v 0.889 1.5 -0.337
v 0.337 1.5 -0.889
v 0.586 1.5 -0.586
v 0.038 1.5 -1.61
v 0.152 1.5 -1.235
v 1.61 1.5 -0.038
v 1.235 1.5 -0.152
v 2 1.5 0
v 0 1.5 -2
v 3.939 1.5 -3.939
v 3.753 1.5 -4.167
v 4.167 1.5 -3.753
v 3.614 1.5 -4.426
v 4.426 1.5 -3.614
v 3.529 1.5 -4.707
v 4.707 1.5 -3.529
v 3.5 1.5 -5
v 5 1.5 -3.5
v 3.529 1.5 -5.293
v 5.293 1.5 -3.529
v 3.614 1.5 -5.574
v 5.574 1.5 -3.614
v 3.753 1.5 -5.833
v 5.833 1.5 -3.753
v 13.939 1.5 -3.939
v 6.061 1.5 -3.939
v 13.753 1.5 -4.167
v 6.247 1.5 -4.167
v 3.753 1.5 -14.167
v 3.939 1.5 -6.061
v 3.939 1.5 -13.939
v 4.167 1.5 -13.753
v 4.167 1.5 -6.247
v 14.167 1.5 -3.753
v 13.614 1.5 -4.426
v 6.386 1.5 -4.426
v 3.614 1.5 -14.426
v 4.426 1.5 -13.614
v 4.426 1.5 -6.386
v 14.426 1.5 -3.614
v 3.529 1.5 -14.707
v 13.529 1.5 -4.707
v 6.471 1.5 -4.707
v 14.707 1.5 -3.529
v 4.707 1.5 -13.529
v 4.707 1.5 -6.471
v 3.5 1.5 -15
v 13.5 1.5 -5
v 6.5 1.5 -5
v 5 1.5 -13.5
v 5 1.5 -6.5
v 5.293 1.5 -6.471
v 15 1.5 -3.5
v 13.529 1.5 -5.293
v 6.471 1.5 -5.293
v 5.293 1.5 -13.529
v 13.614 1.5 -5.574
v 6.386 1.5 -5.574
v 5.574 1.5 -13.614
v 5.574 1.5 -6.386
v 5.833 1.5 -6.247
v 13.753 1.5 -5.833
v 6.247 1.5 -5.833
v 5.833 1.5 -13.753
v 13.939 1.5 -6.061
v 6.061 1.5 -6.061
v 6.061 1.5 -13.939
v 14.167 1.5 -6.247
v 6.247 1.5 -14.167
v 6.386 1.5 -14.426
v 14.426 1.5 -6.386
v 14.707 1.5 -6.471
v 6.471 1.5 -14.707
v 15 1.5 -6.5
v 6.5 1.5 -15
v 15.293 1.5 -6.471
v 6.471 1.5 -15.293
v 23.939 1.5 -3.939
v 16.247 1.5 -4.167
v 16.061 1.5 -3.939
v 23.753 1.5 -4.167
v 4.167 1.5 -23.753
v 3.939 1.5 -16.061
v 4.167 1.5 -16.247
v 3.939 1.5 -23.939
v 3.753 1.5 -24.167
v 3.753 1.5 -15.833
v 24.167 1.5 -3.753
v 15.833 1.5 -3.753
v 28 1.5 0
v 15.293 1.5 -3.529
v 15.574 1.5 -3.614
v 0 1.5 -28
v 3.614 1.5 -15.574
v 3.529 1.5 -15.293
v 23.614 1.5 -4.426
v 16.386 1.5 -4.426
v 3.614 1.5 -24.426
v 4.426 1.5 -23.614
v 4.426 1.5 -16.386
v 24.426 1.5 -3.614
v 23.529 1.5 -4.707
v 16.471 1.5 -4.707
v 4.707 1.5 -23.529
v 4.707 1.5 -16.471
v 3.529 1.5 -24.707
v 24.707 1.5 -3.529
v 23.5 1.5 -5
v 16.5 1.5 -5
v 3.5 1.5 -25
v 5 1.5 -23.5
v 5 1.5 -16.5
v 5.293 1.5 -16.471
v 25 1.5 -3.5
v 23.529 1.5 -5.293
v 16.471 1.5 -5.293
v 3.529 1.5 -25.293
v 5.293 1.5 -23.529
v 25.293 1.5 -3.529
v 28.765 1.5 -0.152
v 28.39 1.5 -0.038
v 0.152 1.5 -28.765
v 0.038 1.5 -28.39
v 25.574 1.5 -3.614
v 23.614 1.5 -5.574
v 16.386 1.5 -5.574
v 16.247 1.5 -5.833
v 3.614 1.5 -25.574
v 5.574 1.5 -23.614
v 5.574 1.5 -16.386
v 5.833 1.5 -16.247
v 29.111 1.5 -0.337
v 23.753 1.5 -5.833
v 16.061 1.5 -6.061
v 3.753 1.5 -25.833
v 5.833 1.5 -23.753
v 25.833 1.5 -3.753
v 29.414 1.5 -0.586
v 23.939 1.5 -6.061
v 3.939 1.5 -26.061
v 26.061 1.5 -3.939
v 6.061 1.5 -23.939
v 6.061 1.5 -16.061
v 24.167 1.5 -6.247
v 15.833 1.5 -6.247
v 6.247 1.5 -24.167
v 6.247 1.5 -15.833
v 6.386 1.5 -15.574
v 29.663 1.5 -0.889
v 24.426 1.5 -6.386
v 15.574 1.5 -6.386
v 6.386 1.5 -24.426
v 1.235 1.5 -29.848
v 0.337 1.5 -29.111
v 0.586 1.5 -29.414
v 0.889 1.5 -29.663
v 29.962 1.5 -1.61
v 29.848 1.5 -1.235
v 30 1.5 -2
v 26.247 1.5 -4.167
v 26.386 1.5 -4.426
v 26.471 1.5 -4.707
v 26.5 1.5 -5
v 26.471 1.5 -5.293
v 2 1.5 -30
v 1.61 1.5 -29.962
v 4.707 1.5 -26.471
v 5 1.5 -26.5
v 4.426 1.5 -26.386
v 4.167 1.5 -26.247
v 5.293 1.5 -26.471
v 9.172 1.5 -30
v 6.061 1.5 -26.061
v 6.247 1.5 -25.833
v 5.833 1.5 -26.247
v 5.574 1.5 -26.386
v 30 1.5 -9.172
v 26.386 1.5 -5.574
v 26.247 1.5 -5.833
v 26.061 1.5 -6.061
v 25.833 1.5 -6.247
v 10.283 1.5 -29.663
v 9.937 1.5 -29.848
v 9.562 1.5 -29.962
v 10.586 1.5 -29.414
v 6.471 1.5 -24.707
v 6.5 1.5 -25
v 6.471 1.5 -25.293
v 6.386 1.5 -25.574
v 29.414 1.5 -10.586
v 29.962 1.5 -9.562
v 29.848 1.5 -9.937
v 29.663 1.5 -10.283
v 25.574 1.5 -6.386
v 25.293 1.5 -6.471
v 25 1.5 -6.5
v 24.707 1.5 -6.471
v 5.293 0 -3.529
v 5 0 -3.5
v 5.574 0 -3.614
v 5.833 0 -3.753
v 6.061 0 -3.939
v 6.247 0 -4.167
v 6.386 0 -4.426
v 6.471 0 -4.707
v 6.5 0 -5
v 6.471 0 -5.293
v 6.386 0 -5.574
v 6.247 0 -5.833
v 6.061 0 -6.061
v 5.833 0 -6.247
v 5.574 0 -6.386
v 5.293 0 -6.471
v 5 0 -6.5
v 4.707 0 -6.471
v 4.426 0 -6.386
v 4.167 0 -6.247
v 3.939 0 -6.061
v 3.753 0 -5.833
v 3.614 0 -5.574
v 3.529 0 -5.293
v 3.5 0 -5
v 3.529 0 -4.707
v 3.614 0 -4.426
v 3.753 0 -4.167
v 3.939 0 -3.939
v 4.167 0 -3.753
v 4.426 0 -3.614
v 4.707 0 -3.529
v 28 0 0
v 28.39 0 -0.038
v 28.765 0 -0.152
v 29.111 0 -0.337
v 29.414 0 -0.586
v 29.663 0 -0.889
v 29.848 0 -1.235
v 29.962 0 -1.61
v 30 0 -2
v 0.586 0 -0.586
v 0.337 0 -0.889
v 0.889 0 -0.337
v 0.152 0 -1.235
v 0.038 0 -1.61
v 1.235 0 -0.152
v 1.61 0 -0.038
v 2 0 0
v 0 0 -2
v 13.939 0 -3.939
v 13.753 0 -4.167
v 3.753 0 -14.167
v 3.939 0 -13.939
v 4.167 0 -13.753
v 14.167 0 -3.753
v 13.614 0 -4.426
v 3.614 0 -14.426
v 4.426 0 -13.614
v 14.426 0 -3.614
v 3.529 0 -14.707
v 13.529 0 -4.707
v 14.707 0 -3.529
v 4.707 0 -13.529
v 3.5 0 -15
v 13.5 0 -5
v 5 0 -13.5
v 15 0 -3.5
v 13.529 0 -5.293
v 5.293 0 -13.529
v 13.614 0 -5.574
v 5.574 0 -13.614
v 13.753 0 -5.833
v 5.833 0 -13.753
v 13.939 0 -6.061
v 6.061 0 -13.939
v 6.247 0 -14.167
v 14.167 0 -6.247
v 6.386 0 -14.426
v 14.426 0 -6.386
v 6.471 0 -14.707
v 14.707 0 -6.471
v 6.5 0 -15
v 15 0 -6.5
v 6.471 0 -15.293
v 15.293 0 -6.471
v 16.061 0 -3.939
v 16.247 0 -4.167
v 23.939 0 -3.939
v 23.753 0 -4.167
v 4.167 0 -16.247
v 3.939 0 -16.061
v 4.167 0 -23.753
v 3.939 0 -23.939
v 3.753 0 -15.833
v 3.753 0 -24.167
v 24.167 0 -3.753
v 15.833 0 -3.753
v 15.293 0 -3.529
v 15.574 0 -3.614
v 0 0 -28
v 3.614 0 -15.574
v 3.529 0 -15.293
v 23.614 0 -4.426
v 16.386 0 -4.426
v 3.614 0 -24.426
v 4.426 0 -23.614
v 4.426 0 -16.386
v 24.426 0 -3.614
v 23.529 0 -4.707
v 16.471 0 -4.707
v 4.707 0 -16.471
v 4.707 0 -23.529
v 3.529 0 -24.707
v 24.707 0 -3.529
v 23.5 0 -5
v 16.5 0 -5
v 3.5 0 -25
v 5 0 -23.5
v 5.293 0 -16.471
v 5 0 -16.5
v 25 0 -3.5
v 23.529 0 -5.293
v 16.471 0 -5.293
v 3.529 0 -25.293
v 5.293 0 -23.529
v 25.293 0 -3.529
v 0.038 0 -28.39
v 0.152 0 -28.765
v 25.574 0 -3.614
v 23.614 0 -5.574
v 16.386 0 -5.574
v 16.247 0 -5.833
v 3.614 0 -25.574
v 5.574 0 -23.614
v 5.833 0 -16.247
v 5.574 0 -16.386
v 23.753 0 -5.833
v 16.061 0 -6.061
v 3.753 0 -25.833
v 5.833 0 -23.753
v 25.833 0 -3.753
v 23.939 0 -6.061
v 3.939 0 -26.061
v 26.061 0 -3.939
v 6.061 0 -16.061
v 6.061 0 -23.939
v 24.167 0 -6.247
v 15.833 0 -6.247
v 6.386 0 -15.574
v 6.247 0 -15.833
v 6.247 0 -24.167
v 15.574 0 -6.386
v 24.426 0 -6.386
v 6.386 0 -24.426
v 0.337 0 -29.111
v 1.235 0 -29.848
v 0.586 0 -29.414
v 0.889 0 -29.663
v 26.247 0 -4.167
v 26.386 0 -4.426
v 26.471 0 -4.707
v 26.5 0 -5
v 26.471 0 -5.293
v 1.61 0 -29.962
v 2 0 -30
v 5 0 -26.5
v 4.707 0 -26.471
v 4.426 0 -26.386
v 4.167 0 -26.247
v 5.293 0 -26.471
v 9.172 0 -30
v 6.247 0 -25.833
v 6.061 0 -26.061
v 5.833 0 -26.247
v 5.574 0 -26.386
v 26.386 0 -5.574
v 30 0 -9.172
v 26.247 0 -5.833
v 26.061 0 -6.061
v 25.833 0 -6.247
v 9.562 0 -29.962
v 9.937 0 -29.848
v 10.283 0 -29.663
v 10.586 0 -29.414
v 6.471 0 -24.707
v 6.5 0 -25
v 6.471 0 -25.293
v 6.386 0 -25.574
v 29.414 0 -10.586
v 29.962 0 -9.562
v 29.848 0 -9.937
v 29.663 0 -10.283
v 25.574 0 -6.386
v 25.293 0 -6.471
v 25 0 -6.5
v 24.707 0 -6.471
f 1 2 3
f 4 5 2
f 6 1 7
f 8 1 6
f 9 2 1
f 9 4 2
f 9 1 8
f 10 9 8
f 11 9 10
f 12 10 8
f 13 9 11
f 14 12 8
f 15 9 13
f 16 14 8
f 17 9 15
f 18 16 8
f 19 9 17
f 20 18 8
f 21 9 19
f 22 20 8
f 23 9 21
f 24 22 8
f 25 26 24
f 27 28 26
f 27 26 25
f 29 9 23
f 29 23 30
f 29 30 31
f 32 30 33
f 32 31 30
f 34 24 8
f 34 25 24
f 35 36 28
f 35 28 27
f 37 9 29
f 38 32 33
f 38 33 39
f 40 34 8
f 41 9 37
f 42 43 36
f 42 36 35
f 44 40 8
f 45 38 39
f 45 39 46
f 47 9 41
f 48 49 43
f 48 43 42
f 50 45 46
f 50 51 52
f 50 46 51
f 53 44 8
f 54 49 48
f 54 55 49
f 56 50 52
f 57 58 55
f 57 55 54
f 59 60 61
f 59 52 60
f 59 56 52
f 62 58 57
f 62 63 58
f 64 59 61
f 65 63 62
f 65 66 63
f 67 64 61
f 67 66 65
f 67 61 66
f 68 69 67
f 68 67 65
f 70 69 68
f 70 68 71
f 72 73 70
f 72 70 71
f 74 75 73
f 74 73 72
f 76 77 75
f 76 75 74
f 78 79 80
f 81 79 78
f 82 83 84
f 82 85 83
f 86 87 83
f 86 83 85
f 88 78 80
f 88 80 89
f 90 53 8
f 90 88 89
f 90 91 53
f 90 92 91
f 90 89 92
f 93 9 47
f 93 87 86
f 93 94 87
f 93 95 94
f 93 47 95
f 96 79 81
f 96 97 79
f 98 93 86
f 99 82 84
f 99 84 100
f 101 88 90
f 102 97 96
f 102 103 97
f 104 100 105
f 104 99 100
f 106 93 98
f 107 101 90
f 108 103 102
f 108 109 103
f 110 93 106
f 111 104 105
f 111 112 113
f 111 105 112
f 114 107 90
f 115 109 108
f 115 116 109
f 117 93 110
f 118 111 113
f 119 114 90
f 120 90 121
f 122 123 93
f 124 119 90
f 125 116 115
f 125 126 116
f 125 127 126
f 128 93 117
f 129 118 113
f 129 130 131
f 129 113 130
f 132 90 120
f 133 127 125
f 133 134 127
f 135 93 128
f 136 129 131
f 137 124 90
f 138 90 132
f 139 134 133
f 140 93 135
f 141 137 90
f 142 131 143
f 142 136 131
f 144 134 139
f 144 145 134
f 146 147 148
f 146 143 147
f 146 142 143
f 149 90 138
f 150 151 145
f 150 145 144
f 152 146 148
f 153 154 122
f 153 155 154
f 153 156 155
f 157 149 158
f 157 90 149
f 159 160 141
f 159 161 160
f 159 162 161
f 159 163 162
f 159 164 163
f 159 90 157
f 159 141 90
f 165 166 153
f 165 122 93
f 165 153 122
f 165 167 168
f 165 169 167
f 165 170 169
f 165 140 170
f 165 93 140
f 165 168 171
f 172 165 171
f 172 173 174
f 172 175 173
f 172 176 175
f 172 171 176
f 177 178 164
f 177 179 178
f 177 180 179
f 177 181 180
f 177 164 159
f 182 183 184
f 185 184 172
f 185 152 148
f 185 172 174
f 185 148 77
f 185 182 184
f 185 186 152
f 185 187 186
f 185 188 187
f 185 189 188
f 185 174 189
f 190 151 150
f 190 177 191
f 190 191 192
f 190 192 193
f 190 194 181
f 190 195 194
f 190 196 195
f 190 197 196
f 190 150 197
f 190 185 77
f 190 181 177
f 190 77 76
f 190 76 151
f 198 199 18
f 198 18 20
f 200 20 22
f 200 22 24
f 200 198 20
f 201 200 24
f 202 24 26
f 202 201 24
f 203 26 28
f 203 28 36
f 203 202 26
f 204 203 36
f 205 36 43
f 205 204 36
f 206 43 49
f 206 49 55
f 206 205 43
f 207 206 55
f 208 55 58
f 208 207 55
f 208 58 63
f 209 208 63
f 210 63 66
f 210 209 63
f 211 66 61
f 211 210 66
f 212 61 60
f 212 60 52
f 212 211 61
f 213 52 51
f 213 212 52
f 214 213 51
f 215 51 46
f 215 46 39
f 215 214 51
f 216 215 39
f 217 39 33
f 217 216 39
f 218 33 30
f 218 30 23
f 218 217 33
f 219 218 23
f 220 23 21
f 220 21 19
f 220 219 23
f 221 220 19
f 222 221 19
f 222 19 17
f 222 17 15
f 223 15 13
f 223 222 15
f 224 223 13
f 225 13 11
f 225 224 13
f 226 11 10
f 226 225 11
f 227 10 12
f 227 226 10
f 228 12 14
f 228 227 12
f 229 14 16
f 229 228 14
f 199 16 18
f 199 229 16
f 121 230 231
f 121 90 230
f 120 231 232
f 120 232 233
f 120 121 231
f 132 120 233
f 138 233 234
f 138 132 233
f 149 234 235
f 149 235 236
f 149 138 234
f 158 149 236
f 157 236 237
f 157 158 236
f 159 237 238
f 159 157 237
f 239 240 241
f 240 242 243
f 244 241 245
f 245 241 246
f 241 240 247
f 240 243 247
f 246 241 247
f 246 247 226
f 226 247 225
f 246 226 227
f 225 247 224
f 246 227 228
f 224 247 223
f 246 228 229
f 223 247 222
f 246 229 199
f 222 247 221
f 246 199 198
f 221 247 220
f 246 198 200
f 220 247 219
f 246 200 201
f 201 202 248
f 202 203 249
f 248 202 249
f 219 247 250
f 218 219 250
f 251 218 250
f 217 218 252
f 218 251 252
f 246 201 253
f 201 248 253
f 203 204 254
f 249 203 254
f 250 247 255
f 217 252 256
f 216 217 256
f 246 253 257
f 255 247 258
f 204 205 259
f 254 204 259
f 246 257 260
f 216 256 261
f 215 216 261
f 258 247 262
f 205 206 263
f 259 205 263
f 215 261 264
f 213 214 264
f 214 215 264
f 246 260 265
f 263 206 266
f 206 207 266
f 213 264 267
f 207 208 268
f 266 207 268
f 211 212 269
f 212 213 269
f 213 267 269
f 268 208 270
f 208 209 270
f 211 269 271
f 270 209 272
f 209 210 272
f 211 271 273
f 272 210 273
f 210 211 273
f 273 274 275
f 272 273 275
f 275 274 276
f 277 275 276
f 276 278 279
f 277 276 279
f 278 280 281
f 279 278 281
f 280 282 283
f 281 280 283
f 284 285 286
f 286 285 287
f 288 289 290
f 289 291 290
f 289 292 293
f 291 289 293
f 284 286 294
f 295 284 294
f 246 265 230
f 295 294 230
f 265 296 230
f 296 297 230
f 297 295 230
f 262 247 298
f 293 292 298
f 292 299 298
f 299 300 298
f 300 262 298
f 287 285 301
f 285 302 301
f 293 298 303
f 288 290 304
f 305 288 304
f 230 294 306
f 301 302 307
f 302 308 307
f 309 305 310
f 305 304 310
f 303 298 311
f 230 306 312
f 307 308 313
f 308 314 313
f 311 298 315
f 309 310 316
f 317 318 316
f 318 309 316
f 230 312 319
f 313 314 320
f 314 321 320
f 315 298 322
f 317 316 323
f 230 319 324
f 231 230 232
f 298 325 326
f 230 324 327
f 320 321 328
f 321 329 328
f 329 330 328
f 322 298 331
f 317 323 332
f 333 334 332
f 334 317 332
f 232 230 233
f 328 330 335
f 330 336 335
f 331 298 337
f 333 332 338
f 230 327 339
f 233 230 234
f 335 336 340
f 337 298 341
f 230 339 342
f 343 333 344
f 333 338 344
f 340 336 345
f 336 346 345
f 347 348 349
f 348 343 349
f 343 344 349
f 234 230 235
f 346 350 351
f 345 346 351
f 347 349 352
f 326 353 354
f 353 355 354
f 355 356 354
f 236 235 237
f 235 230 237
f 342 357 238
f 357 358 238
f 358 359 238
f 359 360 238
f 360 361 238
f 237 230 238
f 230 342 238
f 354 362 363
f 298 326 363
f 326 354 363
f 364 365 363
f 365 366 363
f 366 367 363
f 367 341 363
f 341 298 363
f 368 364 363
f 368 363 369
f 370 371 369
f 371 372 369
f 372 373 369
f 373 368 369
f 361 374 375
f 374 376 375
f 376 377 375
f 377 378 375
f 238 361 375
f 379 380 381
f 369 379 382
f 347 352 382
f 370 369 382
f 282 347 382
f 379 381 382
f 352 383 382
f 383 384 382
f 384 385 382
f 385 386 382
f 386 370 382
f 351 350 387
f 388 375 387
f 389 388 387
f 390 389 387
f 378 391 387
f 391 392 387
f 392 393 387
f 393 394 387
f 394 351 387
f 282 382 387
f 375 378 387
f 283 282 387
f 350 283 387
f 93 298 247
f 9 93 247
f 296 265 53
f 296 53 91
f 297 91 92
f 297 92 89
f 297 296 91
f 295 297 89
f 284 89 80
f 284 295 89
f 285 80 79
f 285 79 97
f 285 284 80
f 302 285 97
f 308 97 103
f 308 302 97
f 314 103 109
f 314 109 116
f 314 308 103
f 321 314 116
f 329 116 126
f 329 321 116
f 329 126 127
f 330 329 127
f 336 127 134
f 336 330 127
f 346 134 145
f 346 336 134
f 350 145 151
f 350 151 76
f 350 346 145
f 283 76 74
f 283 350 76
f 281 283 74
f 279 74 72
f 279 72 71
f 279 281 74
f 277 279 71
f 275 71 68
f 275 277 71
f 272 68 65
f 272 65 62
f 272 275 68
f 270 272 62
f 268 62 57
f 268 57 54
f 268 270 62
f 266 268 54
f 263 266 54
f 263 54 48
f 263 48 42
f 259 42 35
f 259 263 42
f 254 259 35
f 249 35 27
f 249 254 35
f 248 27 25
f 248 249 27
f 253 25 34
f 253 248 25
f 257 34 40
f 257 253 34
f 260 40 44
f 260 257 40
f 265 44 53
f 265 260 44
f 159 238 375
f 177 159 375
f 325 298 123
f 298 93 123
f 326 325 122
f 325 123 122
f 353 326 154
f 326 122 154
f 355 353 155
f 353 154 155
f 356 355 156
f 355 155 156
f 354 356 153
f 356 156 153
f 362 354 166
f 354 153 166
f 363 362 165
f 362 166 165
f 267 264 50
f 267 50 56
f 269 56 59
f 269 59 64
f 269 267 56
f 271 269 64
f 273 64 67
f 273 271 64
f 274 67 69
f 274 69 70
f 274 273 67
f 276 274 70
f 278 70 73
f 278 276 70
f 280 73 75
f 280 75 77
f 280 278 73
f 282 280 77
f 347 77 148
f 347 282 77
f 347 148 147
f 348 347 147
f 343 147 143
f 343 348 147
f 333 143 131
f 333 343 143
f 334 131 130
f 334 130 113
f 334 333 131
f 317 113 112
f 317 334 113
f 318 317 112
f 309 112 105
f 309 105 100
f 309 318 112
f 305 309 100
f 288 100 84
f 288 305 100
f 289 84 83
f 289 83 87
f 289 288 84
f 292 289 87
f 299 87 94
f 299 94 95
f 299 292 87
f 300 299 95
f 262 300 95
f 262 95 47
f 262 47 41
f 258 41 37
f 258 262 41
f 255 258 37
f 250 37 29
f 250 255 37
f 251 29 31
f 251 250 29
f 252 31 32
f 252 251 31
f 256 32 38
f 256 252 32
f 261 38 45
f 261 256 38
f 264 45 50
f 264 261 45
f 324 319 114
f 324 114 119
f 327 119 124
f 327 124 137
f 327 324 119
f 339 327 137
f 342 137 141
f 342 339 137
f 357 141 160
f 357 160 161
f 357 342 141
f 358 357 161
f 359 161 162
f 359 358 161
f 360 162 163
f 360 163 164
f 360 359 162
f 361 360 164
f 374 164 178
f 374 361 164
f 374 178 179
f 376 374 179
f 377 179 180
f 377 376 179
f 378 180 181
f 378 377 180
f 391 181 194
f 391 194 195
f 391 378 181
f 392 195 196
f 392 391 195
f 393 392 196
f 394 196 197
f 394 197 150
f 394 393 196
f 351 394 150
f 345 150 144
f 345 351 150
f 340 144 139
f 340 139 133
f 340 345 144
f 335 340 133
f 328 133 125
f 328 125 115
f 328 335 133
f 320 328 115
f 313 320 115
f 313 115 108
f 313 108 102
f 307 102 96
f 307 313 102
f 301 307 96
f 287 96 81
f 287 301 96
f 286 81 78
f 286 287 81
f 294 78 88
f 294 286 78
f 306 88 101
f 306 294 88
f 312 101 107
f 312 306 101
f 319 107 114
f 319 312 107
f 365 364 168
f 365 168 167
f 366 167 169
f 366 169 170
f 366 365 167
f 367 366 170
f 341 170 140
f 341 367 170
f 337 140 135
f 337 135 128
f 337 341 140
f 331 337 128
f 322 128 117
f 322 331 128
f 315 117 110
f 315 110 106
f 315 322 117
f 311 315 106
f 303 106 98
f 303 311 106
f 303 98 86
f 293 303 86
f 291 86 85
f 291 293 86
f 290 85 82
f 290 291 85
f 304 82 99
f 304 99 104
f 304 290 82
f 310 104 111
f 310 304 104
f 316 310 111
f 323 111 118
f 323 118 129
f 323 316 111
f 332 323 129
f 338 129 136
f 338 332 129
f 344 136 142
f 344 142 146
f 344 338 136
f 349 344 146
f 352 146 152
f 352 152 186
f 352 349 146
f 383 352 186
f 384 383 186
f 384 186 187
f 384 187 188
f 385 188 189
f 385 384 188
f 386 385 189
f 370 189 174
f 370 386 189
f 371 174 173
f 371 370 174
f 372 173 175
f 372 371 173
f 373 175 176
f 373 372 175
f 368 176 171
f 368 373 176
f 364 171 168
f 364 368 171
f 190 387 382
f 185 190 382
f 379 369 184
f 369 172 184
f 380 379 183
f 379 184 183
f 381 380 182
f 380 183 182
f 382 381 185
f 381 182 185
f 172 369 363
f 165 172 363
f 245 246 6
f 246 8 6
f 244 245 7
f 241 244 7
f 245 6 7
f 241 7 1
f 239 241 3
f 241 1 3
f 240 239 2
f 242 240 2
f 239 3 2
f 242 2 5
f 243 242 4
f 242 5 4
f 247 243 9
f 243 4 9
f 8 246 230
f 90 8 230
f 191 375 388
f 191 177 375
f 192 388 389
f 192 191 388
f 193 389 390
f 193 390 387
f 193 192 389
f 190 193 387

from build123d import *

# Parameters (mm, degrees)
SKETCH_2_R      = 1.5
EXTRUDE_1_DEPTH = 1.5
FILLET_1_R      = 2


with BuildPart() as part:
    # ｽｹｯﾁ2 → ﾎﾞｽ - 押し出し1 (new body)
    with BuildSketch(Plane(origin=(0, 0, 0), x_dir=(1, 0, 0), z_dir=(0, 1, 0))):
        Polygon((0, 0), (30, 0), (30, 10), (10, 30), (0, 30), align=None)
        with Locations(Location((5, 5, 0), (0, 0, 270))):
            Circle(SKETCH_2_R, mode=Mode.SUBTRACT)
        with Locations(Location((25, 5, 0), (0, 0, 270))):
            Circle(SKETCH_2_R, mode=Mode.SUBTRACT)
        with Locations(Location((5, 25, 0), (0, 0, 90))):
            Circle(SKETCH_2_R, mode=Mode.SUBTRACT)
        with Locations(Location((15, 5, 0), (0, 0, 270))):
            Circle(SKETCH_2_R, mode=Mode.SUBTRACT)
        with Locations(Location((5, 15, 0), (0, 0, 270))):
            Circle(SKETCH_2_R, mode=Mode.SUBTRACT)
    extrude(amount=EXTRUDE_1_DEPTH)

    # ﾌｨﾚｯﾄ1
    fillet_1_edges = [part.edges().sort_by_distance(p)[0] for p in [
        (0, 0.75, -30),
        (10, 0.75, -30),
        (30, 0.75, -10),
        (30, 0.75, 0),
        (0, 0.75, 0),
    ]]
    fillet(fillet_1_edges, radius=FILLET_1_R)


solid = part.part
